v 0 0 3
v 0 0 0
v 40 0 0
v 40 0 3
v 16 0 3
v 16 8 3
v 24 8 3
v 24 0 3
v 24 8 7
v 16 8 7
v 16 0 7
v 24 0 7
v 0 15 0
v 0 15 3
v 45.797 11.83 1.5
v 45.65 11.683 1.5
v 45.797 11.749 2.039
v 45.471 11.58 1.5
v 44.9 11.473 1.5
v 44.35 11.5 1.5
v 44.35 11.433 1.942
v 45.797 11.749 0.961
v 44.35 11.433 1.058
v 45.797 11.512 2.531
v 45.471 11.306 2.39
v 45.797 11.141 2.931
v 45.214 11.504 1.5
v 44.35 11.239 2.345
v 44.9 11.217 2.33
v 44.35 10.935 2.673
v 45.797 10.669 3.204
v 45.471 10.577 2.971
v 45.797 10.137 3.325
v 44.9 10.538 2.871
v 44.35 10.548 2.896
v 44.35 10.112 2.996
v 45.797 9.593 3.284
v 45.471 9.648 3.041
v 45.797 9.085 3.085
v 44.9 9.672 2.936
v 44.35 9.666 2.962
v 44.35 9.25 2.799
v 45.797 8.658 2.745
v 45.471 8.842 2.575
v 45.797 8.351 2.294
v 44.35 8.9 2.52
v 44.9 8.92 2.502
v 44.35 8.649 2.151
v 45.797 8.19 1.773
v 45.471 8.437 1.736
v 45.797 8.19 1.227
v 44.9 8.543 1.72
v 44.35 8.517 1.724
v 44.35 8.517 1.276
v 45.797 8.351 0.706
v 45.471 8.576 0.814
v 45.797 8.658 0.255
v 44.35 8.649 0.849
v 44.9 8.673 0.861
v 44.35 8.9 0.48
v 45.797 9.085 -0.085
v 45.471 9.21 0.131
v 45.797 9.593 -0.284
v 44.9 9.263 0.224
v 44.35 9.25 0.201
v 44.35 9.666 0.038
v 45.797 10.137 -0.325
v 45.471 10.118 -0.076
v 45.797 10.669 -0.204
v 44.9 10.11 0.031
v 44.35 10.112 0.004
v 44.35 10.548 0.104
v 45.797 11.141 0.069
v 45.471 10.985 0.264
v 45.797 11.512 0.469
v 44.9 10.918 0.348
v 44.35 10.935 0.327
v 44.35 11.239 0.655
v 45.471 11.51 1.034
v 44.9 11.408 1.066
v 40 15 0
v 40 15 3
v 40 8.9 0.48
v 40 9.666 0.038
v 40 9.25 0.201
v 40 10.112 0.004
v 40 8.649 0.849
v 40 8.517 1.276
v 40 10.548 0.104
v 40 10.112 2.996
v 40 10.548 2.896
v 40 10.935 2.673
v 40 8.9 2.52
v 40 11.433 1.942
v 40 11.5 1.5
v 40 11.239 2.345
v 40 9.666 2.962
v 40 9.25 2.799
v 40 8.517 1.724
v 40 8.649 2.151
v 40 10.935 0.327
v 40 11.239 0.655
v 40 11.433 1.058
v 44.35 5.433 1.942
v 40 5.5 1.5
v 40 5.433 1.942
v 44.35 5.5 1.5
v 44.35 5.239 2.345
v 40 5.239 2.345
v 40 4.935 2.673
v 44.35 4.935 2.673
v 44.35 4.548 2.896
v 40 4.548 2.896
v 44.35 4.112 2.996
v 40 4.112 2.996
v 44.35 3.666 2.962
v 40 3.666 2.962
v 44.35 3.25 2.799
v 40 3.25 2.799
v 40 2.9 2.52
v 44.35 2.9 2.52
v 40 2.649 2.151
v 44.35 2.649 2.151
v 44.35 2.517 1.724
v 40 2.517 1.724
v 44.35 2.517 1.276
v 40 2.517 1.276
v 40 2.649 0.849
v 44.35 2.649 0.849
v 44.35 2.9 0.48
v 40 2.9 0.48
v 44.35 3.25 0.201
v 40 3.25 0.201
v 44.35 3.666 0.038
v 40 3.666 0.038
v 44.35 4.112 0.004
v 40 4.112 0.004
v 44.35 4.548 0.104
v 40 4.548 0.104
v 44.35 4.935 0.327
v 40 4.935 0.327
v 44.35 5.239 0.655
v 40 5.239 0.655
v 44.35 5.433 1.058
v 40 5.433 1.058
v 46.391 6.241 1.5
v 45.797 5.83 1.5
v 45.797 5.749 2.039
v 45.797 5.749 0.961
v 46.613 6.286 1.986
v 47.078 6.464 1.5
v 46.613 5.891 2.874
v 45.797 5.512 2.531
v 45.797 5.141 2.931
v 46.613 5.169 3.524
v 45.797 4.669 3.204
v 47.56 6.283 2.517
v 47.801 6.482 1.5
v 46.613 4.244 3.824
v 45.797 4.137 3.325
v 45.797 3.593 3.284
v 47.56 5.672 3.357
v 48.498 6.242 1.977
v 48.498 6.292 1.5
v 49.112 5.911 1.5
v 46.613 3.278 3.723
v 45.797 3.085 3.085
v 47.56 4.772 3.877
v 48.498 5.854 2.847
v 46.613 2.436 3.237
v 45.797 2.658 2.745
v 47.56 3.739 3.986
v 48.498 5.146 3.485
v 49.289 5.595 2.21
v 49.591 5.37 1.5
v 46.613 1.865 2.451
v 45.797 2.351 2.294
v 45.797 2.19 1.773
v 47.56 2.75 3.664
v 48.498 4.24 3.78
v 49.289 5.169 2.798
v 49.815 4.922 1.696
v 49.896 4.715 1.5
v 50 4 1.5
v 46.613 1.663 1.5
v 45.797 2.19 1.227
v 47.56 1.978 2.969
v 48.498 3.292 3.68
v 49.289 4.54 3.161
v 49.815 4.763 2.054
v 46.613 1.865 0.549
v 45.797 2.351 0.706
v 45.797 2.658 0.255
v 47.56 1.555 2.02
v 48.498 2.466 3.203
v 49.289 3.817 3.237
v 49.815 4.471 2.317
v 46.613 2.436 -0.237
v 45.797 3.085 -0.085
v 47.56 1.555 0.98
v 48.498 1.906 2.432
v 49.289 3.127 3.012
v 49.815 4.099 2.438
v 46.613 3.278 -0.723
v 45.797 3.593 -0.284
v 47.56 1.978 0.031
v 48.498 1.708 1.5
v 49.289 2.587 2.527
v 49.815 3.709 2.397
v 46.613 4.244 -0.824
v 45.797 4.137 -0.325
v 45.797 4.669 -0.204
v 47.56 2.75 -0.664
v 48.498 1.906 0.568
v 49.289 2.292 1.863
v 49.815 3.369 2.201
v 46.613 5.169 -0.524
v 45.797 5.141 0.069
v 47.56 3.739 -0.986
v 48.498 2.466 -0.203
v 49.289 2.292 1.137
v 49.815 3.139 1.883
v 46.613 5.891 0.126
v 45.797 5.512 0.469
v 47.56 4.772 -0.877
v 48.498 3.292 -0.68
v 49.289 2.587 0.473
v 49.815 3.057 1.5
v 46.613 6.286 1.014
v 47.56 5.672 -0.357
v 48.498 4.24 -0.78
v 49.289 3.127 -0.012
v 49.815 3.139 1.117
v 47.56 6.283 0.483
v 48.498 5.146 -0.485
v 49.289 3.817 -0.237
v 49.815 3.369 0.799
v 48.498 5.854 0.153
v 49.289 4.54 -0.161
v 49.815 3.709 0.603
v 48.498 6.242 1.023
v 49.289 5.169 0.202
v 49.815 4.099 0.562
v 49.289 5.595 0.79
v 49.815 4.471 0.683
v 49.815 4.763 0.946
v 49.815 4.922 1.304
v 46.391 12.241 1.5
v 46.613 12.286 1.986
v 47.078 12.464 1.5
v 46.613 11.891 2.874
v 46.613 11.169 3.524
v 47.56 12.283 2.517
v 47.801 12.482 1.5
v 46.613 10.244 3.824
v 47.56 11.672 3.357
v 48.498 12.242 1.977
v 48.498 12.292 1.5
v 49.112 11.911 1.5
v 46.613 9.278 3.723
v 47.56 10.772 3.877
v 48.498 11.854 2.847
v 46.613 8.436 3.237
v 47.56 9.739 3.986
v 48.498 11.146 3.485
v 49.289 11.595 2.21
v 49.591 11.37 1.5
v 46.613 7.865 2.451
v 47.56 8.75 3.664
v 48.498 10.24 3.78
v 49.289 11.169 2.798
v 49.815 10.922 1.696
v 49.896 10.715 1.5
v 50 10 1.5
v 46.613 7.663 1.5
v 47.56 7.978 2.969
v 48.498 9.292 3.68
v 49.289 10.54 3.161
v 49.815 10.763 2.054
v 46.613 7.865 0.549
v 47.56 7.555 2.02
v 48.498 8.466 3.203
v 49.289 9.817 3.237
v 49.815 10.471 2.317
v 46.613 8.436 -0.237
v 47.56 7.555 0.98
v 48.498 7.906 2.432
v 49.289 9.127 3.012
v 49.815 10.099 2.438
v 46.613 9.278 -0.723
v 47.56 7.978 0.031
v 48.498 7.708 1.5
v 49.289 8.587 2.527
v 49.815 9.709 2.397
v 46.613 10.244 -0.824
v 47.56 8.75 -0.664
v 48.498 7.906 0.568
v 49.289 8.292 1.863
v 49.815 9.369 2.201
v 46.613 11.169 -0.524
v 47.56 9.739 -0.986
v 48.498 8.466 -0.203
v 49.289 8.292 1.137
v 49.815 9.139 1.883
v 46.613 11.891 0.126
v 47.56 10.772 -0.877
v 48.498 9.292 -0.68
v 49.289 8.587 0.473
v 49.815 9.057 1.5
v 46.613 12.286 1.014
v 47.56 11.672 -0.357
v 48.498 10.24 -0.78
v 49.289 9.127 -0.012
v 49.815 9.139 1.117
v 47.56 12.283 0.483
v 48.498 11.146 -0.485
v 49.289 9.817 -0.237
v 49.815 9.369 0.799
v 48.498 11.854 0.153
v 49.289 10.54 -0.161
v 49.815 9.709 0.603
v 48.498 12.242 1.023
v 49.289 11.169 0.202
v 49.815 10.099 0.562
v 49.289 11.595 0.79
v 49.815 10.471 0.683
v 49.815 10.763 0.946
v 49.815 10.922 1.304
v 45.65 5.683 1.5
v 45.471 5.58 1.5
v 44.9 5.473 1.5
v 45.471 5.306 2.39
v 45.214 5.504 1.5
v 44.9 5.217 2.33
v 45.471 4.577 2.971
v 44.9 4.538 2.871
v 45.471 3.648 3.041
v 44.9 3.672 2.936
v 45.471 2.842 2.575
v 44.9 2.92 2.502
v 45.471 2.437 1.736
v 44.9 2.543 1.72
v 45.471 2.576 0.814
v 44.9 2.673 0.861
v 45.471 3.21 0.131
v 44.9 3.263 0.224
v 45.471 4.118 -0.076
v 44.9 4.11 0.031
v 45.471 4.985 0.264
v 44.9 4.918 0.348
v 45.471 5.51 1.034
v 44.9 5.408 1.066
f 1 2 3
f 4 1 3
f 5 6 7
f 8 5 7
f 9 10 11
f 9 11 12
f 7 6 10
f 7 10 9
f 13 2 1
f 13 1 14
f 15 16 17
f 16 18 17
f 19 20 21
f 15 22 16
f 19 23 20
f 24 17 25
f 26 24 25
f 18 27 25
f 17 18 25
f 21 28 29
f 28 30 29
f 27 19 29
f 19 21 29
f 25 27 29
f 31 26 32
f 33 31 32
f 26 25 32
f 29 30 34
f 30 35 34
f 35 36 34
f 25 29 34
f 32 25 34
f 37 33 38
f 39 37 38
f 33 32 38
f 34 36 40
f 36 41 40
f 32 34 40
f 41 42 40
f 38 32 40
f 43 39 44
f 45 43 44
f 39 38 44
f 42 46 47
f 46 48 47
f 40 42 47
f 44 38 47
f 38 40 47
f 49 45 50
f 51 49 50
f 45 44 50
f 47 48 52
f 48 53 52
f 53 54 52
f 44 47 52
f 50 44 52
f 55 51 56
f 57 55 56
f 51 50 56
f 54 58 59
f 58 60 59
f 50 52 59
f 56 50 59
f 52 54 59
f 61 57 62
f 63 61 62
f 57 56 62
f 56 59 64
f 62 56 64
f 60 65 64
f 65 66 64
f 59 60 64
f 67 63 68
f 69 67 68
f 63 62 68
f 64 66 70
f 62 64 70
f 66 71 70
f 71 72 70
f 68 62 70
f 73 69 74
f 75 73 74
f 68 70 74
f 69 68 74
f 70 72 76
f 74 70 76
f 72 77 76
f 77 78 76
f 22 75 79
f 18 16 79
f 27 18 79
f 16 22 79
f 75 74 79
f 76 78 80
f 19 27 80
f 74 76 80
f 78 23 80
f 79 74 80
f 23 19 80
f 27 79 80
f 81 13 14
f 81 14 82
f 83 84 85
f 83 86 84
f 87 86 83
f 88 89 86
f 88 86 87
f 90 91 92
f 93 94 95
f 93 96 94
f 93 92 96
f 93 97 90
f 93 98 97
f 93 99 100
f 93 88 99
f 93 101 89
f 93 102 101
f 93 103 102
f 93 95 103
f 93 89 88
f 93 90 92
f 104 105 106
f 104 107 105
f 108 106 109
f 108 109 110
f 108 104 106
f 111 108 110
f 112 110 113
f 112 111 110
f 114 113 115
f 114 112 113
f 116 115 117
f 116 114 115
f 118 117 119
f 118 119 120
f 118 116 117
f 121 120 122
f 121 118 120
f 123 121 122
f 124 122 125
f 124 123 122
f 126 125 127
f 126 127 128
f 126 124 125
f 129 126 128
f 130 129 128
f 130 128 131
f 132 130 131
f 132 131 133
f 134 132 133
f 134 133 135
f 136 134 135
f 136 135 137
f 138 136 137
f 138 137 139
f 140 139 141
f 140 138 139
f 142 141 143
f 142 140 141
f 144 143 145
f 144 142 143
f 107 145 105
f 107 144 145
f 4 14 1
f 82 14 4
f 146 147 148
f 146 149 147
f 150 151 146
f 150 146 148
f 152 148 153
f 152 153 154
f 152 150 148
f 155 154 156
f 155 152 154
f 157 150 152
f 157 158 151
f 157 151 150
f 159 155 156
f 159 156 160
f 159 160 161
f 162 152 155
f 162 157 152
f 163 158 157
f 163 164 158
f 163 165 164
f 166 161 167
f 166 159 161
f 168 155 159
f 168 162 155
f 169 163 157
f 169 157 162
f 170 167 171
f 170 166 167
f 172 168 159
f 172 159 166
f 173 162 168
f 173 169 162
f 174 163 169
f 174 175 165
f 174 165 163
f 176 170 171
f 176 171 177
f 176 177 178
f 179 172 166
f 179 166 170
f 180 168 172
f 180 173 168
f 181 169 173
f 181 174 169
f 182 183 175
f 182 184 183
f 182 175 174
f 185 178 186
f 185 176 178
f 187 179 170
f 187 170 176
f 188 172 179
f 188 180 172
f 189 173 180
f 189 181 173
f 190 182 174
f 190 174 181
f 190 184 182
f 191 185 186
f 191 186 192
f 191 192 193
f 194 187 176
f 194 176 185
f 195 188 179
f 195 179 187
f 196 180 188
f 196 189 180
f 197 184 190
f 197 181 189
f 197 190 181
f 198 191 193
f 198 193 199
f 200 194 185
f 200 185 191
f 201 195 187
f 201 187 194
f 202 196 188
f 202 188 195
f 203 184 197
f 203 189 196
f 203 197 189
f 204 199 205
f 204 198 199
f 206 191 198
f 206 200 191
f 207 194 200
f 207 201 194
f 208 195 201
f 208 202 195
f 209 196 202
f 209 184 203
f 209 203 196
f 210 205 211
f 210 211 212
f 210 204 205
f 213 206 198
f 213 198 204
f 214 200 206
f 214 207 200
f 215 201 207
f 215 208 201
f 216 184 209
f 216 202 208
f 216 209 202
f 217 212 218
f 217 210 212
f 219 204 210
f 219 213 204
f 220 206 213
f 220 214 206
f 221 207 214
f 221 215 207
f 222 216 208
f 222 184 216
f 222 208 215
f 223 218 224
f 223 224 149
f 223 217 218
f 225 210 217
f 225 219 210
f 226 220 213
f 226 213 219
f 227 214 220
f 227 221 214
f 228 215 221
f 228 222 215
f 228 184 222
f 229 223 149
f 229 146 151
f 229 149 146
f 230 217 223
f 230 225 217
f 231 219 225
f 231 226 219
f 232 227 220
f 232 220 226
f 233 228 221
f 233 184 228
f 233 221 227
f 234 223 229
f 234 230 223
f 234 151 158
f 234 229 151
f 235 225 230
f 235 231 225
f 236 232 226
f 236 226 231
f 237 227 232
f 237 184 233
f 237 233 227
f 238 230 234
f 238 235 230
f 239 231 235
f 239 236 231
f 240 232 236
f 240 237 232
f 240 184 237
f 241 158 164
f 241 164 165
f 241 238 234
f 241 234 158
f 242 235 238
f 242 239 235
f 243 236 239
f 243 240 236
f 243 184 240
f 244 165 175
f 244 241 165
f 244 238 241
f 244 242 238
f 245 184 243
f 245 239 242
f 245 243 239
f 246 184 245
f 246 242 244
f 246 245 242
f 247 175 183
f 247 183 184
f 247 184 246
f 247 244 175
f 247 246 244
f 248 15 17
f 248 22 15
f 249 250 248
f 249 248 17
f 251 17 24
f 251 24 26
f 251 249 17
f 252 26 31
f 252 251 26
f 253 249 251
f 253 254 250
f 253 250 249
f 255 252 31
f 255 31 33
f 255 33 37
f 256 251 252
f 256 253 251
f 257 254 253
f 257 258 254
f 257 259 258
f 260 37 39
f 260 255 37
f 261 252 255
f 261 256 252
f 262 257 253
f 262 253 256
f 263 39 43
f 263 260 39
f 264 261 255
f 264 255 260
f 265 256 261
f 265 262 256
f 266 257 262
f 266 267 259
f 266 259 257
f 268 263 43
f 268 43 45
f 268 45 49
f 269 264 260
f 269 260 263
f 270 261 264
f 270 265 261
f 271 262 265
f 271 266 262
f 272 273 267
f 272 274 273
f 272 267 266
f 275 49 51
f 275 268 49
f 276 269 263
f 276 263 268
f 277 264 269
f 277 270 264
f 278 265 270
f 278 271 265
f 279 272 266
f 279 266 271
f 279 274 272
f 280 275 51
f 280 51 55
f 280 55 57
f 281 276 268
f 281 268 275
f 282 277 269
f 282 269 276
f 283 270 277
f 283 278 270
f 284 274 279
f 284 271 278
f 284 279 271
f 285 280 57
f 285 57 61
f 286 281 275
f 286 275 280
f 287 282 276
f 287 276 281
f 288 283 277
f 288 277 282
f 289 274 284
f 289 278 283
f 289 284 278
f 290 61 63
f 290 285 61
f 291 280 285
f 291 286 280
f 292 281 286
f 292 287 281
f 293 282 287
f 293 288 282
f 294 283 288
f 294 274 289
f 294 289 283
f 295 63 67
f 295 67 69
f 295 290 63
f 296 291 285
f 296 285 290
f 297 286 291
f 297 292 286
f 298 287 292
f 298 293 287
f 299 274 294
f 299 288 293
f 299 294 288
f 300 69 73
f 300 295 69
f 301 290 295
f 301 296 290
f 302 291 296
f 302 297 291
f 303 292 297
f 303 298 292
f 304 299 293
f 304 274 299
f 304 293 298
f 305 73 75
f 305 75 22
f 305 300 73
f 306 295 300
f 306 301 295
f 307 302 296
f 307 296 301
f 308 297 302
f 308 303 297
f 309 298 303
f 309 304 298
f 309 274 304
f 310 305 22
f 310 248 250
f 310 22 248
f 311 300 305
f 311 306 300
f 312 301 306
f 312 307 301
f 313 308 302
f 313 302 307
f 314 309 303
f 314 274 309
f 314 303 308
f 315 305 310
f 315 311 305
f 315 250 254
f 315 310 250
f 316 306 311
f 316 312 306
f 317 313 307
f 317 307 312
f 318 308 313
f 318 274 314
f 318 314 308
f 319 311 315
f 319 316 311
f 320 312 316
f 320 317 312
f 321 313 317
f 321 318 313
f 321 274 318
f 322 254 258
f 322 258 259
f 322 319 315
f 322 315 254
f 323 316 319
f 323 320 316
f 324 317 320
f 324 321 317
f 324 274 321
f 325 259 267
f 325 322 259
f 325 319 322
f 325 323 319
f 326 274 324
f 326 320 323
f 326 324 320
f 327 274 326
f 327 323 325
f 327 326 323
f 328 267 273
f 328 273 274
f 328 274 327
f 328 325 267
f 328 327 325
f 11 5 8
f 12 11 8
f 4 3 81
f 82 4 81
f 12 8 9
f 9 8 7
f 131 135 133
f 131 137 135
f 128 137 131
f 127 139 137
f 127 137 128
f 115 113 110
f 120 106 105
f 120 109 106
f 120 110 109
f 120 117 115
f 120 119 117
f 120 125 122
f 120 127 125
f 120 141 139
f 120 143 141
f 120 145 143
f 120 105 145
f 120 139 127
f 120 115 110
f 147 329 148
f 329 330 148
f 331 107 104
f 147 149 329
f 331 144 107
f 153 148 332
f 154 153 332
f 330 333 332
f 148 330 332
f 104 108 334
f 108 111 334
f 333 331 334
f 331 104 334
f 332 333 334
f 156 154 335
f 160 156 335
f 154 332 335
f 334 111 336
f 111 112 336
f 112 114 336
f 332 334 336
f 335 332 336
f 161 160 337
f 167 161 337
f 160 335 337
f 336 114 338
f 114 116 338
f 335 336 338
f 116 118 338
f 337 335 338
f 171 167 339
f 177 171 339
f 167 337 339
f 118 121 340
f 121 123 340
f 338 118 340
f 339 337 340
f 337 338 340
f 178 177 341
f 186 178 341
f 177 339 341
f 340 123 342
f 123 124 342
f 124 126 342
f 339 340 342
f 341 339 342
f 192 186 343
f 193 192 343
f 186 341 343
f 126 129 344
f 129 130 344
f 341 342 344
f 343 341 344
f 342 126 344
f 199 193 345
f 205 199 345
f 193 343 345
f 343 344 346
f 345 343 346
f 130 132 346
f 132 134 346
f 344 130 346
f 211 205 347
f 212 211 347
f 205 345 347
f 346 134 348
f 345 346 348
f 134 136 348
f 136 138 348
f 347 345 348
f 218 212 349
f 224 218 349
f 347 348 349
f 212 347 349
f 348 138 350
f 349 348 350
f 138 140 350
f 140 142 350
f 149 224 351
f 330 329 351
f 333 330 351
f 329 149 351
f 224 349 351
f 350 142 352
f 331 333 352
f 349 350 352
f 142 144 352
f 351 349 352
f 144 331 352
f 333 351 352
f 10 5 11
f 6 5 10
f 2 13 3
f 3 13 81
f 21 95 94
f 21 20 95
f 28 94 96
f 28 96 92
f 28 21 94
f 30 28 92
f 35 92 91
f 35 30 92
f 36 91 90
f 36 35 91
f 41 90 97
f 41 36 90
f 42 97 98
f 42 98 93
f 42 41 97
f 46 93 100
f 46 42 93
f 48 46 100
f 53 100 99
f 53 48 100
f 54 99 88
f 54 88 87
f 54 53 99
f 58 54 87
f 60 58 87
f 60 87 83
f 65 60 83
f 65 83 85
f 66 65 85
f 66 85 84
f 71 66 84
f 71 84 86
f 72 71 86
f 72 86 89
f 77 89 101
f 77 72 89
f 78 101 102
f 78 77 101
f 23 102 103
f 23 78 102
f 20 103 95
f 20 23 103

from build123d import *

# Parameters (mm, degrees)
SKETCH_1_W      = 40
SKETCH_1_H      = 15
EXTRUDE_1_DEPTH = 3
SKETCH_2_W      = 8
SKETCH_2_H      = 8
EXTRUDE_2_DEPTH = 4


with BuildPart() as part:
    # 草图1 → 凸台-拉伸1 (new body)
    with BuildSketch(Plane.XY):
        with Locations((20, 7.5)):
            Rectangle(SKETCH_1_W, SKETCH_1_H)
    extrude(amount=EXTRUDE_1_DEPTH)


with BuildPart() as body_2:
    # 草图2 → 凸台-拉伸2 (new body)
    with BuildSketch(Plane.XY.offset(3)):
        with Locations((20, 4)):
            Rectangle(SKETCH_2_W, SKETCH_2_H)
    extrude(amount=EXTRUDE_2_DEPTH)


with BuildPart() as body_3:
    # 草图3 → 旋转2 (revolve)
    with BuildSketch(Plane.XY.offset(1.5)):
        with BuildLine():
            Line((40, 7.5), (44.349624285, 7.5))
            add(Edge.make_bspline(
                [(45.796855132, 7.830108619), (45.482379037, 7.404263724), (44.785241795, 7.457676464), (44.349624285, 7.5)],
                knots=[0, 0, 0, 0, 1, 1, 1, 1], degree=3))
            ThreePointArc((45.796855132, 7.830108619), (48.498032522, 8.29214552), (50, 6))
            Line((50, 6), (40, 6))
            Line((40, 6), (40, 7.5))
        make_face()
    revolve(axis=Axis((40, 6, 1.5), (1, 0, 0)))


with BuildPart() as body_4:
    # Move Body 1: copy of body 3
    add(body_3.part.moved(Location((0, 5, 0))))


with BuildPart() as body_4_1:
    # Move Body 2: moved
    add(body_4.part.moved(Location((0, -2, 0))))


with BuildPart() as body_3_1:
    # Move Body 2: moved
    add(body_3.part.moved(Location((0, -2, 0))))


with BuildPart() as body_4_2:
    # Move Body 3: moved
    add(body_4_1.part.moved(Location((0, 1, 0))))


solid = Compound([part.part, body_2.part, body_3_1.part, body_4_2.part])
